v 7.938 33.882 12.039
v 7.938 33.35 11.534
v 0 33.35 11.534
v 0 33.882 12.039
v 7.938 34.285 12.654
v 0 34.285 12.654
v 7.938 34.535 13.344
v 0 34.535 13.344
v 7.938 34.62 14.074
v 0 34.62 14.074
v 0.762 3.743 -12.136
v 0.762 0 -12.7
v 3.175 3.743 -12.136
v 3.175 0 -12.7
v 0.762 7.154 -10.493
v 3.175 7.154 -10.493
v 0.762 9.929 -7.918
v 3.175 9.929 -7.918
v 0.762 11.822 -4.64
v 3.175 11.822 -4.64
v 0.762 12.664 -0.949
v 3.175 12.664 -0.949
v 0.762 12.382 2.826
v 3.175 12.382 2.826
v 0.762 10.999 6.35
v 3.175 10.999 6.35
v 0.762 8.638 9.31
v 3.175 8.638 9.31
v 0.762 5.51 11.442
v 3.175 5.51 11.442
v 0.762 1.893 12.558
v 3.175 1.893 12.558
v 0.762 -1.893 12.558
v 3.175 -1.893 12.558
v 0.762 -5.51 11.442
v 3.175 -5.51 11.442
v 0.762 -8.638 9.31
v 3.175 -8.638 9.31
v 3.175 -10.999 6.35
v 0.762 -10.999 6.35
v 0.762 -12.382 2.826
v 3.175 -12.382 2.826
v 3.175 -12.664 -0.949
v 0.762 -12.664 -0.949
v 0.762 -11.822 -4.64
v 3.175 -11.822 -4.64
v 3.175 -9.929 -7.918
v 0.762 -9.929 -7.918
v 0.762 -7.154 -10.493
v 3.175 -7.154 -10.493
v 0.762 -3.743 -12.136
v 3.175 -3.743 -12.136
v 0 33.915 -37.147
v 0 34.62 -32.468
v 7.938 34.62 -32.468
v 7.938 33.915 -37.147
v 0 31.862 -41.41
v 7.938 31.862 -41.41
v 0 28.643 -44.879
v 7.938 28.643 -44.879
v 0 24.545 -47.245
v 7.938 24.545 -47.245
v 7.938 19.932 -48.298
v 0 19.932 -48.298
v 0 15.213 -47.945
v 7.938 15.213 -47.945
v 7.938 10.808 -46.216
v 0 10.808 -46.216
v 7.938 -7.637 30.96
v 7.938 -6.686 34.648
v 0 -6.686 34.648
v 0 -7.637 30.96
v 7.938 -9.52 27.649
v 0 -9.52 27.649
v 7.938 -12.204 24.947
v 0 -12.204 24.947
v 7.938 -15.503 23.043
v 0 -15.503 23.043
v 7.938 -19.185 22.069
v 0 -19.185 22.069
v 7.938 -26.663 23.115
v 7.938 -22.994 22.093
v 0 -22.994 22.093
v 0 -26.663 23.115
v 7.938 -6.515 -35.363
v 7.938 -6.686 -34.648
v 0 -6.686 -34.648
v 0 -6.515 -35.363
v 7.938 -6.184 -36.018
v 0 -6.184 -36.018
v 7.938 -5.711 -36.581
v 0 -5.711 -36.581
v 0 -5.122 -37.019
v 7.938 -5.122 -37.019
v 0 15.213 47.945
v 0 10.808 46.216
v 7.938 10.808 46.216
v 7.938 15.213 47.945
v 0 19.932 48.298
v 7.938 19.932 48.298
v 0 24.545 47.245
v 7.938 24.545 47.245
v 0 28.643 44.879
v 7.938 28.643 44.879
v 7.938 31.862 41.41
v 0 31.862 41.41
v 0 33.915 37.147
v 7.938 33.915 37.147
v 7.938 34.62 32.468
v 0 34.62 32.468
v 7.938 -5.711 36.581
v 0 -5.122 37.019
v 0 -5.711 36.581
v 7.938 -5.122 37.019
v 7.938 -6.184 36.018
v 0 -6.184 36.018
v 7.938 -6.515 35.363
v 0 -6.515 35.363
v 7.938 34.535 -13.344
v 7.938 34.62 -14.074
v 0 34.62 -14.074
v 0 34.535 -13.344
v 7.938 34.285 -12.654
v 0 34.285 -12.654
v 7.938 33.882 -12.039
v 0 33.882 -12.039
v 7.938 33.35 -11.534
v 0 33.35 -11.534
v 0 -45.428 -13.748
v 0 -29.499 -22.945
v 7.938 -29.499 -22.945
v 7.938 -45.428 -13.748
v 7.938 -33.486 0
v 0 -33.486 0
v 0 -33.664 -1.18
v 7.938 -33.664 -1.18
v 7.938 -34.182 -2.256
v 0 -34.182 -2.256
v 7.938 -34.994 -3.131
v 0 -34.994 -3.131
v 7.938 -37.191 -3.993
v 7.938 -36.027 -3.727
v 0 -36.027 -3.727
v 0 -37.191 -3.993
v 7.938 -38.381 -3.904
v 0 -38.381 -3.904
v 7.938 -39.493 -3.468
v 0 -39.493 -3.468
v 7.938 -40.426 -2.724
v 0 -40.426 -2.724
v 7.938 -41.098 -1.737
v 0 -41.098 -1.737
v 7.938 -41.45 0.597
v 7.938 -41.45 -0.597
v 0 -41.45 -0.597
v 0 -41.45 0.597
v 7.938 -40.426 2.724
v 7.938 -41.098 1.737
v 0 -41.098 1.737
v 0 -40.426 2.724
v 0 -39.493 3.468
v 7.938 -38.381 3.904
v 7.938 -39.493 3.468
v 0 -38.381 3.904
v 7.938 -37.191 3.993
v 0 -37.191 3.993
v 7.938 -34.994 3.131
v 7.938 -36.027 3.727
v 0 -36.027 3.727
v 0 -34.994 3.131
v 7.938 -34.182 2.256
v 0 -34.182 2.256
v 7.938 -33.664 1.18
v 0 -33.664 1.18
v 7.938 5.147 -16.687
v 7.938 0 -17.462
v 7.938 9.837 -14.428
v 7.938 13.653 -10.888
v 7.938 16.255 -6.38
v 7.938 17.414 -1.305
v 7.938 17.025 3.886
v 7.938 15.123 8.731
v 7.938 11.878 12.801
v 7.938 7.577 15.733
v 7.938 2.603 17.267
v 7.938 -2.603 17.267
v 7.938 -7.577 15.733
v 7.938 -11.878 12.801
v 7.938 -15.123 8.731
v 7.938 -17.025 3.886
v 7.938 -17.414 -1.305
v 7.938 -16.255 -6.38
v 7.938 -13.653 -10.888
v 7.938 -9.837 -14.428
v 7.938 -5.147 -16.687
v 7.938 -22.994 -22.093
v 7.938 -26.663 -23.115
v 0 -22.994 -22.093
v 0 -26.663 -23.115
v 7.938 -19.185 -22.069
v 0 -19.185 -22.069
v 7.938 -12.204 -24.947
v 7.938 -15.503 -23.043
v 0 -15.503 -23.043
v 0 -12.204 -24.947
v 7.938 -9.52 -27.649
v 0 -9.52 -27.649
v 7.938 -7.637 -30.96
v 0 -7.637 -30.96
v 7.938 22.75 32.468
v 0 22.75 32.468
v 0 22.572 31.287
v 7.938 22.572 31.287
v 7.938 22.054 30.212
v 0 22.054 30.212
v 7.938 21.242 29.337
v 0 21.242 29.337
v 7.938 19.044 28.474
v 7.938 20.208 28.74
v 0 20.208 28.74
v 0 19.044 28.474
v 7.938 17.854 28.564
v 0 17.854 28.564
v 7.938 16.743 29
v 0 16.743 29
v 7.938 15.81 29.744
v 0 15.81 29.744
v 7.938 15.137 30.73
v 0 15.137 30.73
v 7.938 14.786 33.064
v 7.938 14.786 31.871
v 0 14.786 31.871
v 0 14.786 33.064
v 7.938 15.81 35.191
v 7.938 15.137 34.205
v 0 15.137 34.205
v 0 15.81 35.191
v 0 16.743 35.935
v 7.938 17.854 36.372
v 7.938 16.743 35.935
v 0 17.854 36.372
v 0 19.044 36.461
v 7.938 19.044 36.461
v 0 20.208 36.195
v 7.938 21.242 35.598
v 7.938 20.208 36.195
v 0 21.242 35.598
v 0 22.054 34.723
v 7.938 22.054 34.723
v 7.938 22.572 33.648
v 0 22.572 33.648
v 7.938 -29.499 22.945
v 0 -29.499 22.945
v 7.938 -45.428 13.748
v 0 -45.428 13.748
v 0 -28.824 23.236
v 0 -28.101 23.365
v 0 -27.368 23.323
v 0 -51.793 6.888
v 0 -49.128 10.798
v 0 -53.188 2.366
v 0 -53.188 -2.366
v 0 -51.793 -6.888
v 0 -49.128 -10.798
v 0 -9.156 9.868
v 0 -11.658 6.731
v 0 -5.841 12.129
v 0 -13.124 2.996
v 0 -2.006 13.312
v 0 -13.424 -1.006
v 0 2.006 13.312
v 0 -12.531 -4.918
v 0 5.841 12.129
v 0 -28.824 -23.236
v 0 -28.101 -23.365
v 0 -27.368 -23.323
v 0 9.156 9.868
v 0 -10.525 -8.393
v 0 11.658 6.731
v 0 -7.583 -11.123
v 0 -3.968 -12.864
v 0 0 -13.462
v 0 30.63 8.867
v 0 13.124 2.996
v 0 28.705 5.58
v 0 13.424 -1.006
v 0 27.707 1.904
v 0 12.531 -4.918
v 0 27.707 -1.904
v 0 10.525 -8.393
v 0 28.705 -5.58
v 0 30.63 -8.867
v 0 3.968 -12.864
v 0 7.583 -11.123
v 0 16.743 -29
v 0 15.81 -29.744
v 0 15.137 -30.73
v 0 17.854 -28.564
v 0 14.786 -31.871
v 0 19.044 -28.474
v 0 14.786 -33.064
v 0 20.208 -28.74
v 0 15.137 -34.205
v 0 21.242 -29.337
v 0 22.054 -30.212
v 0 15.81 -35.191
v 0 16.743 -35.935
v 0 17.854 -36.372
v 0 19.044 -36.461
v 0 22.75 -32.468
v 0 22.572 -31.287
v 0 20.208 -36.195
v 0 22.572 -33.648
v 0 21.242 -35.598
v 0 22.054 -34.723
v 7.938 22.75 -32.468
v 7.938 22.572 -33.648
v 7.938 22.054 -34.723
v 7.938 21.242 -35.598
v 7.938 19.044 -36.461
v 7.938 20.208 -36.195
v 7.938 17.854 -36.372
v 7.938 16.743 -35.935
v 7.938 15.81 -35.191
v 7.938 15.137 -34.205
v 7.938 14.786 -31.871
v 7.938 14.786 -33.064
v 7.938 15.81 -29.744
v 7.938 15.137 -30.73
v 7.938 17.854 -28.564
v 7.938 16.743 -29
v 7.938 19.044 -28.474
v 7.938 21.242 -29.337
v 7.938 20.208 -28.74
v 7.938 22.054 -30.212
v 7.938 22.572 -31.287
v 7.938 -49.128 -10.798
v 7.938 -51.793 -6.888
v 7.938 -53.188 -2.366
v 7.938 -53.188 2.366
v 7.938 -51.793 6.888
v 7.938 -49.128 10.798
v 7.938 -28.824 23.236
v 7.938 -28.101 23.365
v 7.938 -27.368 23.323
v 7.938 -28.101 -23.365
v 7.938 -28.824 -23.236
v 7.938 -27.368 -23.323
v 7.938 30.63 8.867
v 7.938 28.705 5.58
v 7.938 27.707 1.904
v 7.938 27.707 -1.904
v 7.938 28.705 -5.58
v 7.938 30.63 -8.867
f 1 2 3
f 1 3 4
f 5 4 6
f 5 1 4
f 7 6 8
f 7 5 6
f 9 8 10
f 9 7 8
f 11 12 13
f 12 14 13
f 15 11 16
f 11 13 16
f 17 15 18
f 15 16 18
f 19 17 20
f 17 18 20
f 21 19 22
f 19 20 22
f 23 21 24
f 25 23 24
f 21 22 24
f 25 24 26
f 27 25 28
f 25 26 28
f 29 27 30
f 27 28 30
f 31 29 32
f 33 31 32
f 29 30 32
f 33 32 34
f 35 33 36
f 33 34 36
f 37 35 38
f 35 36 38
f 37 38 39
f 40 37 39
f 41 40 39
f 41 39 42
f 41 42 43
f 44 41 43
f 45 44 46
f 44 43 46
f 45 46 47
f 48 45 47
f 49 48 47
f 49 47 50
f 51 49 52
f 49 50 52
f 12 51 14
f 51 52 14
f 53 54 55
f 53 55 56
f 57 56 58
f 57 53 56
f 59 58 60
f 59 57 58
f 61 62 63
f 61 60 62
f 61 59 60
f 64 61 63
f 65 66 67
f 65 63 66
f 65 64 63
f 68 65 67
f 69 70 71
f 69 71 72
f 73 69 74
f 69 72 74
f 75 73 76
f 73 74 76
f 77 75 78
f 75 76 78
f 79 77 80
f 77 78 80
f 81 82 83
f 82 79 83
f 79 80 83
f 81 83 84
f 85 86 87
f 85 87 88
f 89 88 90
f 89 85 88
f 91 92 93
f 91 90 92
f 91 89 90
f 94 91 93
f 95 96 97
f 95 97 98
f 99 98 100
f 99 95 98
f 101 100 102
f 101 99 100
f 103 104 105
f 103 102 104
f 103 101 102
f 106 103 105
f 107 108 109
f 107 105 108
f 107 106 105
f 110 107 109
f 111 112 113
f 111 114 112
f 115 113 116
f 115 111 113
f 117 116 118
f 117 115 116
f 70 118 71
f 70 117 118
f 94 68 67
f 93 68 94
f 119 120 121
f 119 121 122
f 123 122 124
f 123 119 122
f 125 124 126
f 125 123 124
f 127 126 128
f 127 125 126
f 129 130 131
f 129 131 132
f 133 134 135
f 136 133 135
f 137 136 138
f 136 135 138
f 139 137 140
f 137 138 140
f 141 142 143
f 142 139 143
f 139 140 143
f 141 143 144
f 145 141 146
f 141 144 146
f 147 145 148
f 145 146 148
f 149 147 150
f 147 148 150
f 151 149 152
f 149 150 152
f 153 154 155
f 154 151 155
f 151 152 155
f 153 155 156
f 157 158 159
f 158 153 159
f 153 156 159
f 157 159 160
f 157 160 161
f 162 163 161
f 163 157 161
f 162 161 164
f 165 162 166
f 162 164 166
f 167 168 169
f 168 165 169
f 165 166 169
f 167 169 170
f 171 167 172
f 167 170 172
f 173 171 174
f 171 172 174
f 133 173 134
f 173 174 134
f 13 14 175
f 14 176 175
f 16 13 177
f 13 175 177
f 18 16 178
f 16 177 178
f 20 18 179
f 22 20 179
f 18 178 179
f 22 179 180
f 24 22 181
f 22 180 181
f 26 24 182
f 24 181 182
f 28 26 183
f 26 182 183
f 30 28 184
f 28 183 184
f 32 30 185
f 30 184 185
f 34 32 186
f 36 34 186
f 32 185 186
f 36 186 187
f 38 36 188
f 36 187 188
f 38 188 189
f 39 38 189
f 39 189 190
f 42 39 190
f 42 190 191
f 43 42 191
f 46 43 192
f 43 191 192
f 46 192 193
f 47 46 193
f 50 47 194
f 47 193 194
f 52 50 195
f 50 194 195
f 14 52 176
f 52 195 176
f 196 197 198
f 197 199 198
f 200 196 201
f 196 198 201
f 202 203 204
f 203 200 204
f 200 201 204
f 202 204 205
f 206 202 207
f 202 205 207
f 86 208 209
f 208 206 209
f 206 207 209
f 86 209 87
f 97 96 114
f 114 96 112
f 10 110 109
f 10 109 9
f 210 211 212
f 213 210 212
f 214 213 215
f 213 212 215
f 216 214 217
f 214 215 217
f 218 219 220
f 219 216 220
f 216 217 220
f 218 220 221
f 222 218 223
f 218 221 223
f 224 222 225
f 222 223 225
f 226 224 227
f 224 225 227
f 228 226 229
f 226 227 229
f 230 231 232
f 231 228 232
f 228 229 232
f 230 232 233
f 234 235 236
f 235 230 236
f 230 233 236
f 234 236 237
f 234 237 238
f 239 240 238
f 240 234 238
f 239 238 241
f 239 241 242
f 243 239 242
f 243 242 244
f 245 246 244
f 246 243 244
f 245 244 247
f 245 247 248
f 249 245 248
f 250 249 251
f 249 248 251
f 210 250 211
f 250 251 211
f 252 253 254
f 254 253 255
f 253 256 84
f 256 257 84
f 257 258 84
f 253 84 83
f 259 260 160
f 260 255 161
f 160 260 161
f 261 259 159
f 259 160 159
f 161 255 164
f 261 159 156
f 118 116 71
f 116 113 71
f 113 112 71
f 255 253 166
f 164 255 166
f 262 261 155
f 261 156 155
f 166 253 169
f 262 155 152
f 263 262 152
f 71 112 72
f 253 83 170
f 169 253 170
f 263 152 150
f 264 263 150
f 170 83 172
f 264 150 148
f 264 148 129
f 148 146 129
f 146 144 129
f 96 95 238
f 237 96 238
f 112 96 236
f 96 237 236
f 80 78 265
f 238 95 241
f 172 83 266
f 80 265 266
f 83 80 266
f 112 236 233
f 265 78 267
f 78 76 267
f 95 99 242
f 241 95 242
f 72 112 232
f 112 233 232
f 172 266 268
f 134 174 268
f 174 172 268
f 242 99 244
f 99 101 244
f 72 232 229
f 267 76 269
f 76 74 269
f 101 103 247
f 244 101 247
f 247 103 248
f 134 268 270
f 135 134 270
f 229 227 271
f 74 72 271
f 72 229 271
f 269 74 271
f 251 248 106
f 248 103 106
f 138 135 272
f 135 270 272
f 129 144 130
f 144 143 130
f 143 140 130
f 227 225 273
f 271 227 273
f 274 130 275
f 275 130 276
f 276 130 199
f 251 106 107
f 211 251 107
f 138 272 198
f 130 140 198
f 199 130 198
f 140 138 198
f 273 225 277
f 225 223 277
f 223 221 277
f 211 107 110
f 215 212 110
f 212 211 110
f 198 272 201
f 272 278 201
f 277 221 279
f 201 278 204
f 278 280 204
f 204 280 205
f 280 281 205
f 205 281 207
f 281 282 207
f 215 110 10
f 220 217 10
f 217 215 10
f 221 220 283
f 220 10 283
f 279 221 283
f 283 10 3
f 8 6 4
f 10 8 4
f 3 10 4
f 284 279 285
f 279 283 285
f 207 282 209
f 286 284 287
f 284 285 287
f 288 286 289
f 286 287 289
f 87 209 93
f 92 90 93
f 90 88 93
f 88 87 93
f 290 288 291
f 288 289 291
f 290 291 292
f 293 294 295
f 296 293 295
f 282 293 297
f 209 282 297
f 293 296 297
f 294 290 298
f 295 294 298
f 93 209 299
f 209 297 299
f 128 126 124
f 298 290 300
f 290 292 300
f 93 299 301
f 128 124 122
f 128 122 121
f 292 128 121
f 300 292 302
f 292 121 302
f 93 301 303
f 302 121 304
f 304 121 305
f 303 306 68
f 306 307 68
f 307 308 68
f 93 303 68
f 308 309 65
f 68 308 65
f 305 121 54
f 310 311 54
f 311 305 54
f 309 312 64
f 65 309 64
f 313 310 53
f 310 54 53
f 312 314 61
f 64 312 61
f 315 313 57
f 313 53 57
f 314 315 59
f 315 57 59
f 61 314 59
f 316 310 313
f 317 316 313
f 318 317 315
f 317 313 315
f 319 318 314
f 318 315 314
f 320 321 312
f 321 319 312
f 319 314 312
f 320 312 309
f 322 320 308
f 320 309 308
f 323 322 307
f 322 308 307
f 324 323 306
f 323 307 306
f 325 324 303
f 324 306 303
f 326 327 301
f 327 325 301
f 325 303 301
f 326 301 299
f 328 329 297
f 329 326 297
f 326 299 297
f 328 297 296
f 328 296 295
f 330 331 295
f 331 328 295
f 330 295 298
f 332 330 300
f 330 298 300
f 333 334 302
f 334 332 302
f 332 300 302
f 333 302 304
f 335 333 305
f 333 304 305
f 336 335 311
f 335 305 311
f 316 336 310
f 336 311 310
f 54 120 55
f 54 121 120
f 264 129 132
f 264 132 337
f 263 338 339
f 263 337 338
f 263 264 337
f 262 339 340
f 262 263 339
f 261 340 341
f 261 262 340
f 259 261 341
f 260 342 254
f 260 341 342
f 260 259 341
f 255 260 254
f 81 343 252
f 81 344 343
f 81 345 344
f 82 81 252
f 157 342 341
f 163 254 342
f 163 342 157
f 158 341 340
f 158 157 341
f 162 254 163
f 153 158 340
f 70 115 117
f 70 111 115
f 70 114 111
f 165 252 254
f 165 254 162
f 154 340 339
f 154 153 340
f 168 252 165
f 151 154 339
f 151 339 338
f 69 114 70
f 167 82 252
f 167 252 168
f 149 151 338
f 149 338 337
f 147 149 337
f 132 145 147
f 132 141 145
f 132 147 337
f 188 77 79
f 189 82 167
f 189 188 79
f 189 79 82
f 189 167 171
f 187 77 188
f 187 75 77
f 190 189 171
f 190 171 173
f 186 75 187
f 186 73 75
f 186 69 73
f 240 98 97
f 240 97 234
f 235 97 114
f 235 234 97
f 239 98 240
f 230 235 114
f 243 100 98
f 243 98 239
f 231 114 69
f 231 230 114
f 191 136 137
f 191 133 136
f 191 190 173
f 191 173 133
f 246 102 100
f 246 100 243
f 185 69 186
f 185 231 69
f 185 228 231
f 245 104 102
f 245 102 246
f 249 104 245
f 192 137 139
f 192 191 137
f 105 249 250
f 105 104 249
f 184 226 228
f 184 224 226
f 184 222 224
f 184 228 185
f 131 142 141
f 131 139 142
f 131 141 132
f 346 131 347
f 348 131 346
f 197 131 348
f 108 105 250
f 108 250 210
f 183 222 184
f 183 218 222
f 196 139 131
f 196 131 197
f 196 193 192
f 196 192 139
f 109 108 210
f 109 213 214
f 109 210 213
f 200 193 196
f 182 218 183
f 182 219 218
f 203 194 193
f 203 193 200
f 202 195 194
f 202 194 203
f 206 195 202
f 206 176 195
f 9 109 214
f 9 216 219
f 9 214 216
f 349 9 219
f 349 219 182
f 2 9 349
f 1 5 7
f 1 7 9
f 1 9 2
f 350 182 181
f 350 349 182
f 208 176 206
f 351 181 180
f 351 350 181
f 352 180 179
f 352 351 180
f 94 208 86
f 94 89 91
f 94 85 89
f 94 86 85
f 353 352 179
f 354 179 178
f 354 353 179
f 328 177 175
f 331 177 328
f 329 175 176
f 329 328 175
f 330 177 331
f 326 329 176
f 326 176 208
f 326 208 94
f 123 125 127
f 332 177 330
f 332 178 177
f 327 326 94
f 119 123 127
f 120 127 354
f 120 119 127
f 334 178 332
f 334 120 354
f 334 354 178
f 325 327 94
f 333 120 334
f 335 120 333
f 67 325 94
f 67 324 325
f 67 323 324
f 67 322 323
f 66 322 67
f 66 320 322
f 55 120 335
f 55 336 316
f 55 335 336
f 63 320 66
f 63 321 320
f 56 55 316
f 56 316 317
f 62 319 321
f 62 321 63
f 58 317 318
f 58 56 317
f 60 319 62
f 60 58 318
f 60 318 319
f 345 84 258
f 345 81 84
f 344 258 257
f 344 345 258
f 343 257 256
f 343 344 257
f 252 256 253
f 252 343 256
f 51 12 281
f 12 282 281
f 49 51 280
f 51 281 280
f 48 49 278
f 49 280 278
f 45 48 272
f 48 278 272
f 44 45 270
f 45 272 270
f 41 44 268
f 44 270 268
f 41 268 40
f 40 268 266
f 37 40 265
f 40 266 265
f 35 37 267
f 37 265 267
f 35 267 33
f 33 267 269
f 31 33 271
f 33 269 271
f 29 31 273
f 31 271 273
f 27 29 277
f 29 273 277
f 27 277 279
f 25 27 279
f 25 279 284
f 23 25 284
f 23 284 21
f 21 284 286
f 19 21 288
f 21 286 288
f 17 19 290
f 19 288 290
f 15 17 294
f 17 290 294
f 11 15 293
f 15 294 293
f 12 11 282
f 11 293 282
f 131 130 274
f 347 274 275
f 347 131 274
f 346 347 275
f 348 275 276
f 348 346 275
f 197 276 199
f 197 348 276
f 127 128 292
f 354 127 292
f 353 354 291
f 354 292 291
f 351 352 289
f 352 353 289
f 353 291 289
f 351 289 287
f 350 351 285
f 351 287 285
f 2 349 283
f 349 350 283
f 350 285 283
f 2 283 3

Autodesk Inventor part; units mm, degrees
ref_plane "YZ Plane" through (0, 0, 0) normal (1, 0, 0) x (0, 1, 0)
ref_plane "XZ Plane" through (0, 0, 0) normal (0, 1, 0) x (-1, 0, 0)
ref_plane "XY Plane" through (0, 0, 0) normal (0, 0, 1) x (1, 0, 0)
sketch "Sketch1" plane through (0, 0, 0) normal (1, 0, 0) x (0, 1, 0)
  circle A0 centre (0, 0) radius 15.875
  circle A1 centre (18.7452, -32.4676) radius 4.0043
  circle A2 centre (18.7452, -32.4676) radius 15.875
  circle A3 centre (-37.4904, 0) radius 4.0043
  circle A4 centre (-37.4904, 0) radius 15.875
  circle A5 centre (18.7452, 32.4676) radius 15.875
  circle A6 centre (18.7452, 32.4676) radius 4.0043
  circle A7 centre (18.7452, -32.4676) radius 4.0043
  circle A8 centre (18.7452, -32.4676) radius 15.875
  circle A9 centre (0, 0) radius 15.875
  circle A10 centre (-37.4904, 0) radius 4.0043
  circle A11 centre (-37.4904, 0) radius 15.875
  circle A12 centre (18.7452, 32.4676) radius 4.0043
  circle A13 centre (18.7452, 32.4676) radius 15.875
  line L0 (34.6202, 32.4676) -> (34.6202, -32.4676)
  line L1 (10.8077, -46.2158) -> (-45.4279, -13.7482)
  line L2 (10.8077, 46.2158) -> (-45.4279, 13.7482)
  circle A14 centre (18.7452, 32.4676) radius 15.875
  circle A15 centre (-37.4904, 0) radius 15.875
  circle A16 centre (18.7452, -32.4676) radius 15.875
  circle A17 centre (41.995, 0) radius 14.4142
  circle A18 centre (-20.9975, 36.3687) radius 14.4142
  circle A19 centre (-20.9975, -36.3687) radius 14.4142
  point P0 (-28.0356, -23.7896)
  point P1 (-6.5846, -36.1743)
  point P2 (10.8077, -46.2158)
  point P3 (34.6202, -12.3847)
  point P4 (34.6202, 12.3847)
  point P5 (-6.5846, 36.1743)
  point P6 (-28.0356, 23.7896)
  point P7 (-45.4279, 13.7482)
  point P8 (-45.4279, -13.7482)
  dimension "d28" = 360
  dimension "d34" = 31.75
  dimension "d35" = 28.8284
  dimension "d36" = 8.0086
  dimension "d37" = 31.75
  dimension "d38" = 31.75
  dimension "d39" = 60
  dimension "d40" = 60
  dimension "d41" = 7.3748
  dimension "d42" = 55.6177
  dimension "d43" = 55.6177
  dimension "d44" = 0
  dimension "d45" = 41.2048
  dimension "d46" = 0
  dimension "d47" = 62.6558
  dimension "d48" = 80.0481
  dimension "d49" = 0
  dimension "d50" = 80.0481
  dimension "d51" = 15.875
  dimension "d52" = 15.875
  dimension "d53" = 23.8125
  dimension "d54" = 80.0481
  dimension "d55" = 34.6202
  dimension "d56" = 34.6202
  dimension "d57" = 41.2048
  dimension "d58" = 0
  dimension "d59" = 41.2048
  dimension "d60" = 62.6558
  dimension "d61" = 62.6558
  dimension "d62" = 0
  dimension "d63" = 62.6558
  dimension "d64" = 41.2048
  dimension "d65" = 72.1106
  dimension "d66" = 80.0481
  dimension "d67" = 0
  dimension "d68" = 80.0481
  dimension "d69" = 23.8125
extrude "Extrusion1" add sketch "Sketch1" along normal blind 7.9375 contours A2 | A2 L1 A19 A4 L2 A18 A5 L0 A17 | A5 | A4
fillet "Fillet2" radius 3.175 6 edges at (3.9688, 34.6202, 12.3847) (3.9688, 34.6202, -12.3847) (3.9688, -6.5846, 36.1743) (3.9688, -28.0356, 23.7896) (3.9688, -6.5846, -36.1743) (3.9688, -28.0356, -23.7896)
sketch "Sketch5" plane through (7.9375, 0, 0) normal (1, 0, 0) x (0, 0, -1)
  circle A0 centre (0, 0) radius 15.875
  circle A1 centre (0, 0) radius 12.7
  dimension "d70" = 25.4
extrude "Extrusion3" add sketch "Sketch5" against normal up to surface (7.9375 mm away)
chamfer "Chamfer5" distance 4.7625 angle 45 1 edges at (7.9375, 0, 12.7)
chamfer "Chamfer7" distance 0.762 angle 45 1 edges at (0, 0, 12.7)
properties part number "DTR-5"
